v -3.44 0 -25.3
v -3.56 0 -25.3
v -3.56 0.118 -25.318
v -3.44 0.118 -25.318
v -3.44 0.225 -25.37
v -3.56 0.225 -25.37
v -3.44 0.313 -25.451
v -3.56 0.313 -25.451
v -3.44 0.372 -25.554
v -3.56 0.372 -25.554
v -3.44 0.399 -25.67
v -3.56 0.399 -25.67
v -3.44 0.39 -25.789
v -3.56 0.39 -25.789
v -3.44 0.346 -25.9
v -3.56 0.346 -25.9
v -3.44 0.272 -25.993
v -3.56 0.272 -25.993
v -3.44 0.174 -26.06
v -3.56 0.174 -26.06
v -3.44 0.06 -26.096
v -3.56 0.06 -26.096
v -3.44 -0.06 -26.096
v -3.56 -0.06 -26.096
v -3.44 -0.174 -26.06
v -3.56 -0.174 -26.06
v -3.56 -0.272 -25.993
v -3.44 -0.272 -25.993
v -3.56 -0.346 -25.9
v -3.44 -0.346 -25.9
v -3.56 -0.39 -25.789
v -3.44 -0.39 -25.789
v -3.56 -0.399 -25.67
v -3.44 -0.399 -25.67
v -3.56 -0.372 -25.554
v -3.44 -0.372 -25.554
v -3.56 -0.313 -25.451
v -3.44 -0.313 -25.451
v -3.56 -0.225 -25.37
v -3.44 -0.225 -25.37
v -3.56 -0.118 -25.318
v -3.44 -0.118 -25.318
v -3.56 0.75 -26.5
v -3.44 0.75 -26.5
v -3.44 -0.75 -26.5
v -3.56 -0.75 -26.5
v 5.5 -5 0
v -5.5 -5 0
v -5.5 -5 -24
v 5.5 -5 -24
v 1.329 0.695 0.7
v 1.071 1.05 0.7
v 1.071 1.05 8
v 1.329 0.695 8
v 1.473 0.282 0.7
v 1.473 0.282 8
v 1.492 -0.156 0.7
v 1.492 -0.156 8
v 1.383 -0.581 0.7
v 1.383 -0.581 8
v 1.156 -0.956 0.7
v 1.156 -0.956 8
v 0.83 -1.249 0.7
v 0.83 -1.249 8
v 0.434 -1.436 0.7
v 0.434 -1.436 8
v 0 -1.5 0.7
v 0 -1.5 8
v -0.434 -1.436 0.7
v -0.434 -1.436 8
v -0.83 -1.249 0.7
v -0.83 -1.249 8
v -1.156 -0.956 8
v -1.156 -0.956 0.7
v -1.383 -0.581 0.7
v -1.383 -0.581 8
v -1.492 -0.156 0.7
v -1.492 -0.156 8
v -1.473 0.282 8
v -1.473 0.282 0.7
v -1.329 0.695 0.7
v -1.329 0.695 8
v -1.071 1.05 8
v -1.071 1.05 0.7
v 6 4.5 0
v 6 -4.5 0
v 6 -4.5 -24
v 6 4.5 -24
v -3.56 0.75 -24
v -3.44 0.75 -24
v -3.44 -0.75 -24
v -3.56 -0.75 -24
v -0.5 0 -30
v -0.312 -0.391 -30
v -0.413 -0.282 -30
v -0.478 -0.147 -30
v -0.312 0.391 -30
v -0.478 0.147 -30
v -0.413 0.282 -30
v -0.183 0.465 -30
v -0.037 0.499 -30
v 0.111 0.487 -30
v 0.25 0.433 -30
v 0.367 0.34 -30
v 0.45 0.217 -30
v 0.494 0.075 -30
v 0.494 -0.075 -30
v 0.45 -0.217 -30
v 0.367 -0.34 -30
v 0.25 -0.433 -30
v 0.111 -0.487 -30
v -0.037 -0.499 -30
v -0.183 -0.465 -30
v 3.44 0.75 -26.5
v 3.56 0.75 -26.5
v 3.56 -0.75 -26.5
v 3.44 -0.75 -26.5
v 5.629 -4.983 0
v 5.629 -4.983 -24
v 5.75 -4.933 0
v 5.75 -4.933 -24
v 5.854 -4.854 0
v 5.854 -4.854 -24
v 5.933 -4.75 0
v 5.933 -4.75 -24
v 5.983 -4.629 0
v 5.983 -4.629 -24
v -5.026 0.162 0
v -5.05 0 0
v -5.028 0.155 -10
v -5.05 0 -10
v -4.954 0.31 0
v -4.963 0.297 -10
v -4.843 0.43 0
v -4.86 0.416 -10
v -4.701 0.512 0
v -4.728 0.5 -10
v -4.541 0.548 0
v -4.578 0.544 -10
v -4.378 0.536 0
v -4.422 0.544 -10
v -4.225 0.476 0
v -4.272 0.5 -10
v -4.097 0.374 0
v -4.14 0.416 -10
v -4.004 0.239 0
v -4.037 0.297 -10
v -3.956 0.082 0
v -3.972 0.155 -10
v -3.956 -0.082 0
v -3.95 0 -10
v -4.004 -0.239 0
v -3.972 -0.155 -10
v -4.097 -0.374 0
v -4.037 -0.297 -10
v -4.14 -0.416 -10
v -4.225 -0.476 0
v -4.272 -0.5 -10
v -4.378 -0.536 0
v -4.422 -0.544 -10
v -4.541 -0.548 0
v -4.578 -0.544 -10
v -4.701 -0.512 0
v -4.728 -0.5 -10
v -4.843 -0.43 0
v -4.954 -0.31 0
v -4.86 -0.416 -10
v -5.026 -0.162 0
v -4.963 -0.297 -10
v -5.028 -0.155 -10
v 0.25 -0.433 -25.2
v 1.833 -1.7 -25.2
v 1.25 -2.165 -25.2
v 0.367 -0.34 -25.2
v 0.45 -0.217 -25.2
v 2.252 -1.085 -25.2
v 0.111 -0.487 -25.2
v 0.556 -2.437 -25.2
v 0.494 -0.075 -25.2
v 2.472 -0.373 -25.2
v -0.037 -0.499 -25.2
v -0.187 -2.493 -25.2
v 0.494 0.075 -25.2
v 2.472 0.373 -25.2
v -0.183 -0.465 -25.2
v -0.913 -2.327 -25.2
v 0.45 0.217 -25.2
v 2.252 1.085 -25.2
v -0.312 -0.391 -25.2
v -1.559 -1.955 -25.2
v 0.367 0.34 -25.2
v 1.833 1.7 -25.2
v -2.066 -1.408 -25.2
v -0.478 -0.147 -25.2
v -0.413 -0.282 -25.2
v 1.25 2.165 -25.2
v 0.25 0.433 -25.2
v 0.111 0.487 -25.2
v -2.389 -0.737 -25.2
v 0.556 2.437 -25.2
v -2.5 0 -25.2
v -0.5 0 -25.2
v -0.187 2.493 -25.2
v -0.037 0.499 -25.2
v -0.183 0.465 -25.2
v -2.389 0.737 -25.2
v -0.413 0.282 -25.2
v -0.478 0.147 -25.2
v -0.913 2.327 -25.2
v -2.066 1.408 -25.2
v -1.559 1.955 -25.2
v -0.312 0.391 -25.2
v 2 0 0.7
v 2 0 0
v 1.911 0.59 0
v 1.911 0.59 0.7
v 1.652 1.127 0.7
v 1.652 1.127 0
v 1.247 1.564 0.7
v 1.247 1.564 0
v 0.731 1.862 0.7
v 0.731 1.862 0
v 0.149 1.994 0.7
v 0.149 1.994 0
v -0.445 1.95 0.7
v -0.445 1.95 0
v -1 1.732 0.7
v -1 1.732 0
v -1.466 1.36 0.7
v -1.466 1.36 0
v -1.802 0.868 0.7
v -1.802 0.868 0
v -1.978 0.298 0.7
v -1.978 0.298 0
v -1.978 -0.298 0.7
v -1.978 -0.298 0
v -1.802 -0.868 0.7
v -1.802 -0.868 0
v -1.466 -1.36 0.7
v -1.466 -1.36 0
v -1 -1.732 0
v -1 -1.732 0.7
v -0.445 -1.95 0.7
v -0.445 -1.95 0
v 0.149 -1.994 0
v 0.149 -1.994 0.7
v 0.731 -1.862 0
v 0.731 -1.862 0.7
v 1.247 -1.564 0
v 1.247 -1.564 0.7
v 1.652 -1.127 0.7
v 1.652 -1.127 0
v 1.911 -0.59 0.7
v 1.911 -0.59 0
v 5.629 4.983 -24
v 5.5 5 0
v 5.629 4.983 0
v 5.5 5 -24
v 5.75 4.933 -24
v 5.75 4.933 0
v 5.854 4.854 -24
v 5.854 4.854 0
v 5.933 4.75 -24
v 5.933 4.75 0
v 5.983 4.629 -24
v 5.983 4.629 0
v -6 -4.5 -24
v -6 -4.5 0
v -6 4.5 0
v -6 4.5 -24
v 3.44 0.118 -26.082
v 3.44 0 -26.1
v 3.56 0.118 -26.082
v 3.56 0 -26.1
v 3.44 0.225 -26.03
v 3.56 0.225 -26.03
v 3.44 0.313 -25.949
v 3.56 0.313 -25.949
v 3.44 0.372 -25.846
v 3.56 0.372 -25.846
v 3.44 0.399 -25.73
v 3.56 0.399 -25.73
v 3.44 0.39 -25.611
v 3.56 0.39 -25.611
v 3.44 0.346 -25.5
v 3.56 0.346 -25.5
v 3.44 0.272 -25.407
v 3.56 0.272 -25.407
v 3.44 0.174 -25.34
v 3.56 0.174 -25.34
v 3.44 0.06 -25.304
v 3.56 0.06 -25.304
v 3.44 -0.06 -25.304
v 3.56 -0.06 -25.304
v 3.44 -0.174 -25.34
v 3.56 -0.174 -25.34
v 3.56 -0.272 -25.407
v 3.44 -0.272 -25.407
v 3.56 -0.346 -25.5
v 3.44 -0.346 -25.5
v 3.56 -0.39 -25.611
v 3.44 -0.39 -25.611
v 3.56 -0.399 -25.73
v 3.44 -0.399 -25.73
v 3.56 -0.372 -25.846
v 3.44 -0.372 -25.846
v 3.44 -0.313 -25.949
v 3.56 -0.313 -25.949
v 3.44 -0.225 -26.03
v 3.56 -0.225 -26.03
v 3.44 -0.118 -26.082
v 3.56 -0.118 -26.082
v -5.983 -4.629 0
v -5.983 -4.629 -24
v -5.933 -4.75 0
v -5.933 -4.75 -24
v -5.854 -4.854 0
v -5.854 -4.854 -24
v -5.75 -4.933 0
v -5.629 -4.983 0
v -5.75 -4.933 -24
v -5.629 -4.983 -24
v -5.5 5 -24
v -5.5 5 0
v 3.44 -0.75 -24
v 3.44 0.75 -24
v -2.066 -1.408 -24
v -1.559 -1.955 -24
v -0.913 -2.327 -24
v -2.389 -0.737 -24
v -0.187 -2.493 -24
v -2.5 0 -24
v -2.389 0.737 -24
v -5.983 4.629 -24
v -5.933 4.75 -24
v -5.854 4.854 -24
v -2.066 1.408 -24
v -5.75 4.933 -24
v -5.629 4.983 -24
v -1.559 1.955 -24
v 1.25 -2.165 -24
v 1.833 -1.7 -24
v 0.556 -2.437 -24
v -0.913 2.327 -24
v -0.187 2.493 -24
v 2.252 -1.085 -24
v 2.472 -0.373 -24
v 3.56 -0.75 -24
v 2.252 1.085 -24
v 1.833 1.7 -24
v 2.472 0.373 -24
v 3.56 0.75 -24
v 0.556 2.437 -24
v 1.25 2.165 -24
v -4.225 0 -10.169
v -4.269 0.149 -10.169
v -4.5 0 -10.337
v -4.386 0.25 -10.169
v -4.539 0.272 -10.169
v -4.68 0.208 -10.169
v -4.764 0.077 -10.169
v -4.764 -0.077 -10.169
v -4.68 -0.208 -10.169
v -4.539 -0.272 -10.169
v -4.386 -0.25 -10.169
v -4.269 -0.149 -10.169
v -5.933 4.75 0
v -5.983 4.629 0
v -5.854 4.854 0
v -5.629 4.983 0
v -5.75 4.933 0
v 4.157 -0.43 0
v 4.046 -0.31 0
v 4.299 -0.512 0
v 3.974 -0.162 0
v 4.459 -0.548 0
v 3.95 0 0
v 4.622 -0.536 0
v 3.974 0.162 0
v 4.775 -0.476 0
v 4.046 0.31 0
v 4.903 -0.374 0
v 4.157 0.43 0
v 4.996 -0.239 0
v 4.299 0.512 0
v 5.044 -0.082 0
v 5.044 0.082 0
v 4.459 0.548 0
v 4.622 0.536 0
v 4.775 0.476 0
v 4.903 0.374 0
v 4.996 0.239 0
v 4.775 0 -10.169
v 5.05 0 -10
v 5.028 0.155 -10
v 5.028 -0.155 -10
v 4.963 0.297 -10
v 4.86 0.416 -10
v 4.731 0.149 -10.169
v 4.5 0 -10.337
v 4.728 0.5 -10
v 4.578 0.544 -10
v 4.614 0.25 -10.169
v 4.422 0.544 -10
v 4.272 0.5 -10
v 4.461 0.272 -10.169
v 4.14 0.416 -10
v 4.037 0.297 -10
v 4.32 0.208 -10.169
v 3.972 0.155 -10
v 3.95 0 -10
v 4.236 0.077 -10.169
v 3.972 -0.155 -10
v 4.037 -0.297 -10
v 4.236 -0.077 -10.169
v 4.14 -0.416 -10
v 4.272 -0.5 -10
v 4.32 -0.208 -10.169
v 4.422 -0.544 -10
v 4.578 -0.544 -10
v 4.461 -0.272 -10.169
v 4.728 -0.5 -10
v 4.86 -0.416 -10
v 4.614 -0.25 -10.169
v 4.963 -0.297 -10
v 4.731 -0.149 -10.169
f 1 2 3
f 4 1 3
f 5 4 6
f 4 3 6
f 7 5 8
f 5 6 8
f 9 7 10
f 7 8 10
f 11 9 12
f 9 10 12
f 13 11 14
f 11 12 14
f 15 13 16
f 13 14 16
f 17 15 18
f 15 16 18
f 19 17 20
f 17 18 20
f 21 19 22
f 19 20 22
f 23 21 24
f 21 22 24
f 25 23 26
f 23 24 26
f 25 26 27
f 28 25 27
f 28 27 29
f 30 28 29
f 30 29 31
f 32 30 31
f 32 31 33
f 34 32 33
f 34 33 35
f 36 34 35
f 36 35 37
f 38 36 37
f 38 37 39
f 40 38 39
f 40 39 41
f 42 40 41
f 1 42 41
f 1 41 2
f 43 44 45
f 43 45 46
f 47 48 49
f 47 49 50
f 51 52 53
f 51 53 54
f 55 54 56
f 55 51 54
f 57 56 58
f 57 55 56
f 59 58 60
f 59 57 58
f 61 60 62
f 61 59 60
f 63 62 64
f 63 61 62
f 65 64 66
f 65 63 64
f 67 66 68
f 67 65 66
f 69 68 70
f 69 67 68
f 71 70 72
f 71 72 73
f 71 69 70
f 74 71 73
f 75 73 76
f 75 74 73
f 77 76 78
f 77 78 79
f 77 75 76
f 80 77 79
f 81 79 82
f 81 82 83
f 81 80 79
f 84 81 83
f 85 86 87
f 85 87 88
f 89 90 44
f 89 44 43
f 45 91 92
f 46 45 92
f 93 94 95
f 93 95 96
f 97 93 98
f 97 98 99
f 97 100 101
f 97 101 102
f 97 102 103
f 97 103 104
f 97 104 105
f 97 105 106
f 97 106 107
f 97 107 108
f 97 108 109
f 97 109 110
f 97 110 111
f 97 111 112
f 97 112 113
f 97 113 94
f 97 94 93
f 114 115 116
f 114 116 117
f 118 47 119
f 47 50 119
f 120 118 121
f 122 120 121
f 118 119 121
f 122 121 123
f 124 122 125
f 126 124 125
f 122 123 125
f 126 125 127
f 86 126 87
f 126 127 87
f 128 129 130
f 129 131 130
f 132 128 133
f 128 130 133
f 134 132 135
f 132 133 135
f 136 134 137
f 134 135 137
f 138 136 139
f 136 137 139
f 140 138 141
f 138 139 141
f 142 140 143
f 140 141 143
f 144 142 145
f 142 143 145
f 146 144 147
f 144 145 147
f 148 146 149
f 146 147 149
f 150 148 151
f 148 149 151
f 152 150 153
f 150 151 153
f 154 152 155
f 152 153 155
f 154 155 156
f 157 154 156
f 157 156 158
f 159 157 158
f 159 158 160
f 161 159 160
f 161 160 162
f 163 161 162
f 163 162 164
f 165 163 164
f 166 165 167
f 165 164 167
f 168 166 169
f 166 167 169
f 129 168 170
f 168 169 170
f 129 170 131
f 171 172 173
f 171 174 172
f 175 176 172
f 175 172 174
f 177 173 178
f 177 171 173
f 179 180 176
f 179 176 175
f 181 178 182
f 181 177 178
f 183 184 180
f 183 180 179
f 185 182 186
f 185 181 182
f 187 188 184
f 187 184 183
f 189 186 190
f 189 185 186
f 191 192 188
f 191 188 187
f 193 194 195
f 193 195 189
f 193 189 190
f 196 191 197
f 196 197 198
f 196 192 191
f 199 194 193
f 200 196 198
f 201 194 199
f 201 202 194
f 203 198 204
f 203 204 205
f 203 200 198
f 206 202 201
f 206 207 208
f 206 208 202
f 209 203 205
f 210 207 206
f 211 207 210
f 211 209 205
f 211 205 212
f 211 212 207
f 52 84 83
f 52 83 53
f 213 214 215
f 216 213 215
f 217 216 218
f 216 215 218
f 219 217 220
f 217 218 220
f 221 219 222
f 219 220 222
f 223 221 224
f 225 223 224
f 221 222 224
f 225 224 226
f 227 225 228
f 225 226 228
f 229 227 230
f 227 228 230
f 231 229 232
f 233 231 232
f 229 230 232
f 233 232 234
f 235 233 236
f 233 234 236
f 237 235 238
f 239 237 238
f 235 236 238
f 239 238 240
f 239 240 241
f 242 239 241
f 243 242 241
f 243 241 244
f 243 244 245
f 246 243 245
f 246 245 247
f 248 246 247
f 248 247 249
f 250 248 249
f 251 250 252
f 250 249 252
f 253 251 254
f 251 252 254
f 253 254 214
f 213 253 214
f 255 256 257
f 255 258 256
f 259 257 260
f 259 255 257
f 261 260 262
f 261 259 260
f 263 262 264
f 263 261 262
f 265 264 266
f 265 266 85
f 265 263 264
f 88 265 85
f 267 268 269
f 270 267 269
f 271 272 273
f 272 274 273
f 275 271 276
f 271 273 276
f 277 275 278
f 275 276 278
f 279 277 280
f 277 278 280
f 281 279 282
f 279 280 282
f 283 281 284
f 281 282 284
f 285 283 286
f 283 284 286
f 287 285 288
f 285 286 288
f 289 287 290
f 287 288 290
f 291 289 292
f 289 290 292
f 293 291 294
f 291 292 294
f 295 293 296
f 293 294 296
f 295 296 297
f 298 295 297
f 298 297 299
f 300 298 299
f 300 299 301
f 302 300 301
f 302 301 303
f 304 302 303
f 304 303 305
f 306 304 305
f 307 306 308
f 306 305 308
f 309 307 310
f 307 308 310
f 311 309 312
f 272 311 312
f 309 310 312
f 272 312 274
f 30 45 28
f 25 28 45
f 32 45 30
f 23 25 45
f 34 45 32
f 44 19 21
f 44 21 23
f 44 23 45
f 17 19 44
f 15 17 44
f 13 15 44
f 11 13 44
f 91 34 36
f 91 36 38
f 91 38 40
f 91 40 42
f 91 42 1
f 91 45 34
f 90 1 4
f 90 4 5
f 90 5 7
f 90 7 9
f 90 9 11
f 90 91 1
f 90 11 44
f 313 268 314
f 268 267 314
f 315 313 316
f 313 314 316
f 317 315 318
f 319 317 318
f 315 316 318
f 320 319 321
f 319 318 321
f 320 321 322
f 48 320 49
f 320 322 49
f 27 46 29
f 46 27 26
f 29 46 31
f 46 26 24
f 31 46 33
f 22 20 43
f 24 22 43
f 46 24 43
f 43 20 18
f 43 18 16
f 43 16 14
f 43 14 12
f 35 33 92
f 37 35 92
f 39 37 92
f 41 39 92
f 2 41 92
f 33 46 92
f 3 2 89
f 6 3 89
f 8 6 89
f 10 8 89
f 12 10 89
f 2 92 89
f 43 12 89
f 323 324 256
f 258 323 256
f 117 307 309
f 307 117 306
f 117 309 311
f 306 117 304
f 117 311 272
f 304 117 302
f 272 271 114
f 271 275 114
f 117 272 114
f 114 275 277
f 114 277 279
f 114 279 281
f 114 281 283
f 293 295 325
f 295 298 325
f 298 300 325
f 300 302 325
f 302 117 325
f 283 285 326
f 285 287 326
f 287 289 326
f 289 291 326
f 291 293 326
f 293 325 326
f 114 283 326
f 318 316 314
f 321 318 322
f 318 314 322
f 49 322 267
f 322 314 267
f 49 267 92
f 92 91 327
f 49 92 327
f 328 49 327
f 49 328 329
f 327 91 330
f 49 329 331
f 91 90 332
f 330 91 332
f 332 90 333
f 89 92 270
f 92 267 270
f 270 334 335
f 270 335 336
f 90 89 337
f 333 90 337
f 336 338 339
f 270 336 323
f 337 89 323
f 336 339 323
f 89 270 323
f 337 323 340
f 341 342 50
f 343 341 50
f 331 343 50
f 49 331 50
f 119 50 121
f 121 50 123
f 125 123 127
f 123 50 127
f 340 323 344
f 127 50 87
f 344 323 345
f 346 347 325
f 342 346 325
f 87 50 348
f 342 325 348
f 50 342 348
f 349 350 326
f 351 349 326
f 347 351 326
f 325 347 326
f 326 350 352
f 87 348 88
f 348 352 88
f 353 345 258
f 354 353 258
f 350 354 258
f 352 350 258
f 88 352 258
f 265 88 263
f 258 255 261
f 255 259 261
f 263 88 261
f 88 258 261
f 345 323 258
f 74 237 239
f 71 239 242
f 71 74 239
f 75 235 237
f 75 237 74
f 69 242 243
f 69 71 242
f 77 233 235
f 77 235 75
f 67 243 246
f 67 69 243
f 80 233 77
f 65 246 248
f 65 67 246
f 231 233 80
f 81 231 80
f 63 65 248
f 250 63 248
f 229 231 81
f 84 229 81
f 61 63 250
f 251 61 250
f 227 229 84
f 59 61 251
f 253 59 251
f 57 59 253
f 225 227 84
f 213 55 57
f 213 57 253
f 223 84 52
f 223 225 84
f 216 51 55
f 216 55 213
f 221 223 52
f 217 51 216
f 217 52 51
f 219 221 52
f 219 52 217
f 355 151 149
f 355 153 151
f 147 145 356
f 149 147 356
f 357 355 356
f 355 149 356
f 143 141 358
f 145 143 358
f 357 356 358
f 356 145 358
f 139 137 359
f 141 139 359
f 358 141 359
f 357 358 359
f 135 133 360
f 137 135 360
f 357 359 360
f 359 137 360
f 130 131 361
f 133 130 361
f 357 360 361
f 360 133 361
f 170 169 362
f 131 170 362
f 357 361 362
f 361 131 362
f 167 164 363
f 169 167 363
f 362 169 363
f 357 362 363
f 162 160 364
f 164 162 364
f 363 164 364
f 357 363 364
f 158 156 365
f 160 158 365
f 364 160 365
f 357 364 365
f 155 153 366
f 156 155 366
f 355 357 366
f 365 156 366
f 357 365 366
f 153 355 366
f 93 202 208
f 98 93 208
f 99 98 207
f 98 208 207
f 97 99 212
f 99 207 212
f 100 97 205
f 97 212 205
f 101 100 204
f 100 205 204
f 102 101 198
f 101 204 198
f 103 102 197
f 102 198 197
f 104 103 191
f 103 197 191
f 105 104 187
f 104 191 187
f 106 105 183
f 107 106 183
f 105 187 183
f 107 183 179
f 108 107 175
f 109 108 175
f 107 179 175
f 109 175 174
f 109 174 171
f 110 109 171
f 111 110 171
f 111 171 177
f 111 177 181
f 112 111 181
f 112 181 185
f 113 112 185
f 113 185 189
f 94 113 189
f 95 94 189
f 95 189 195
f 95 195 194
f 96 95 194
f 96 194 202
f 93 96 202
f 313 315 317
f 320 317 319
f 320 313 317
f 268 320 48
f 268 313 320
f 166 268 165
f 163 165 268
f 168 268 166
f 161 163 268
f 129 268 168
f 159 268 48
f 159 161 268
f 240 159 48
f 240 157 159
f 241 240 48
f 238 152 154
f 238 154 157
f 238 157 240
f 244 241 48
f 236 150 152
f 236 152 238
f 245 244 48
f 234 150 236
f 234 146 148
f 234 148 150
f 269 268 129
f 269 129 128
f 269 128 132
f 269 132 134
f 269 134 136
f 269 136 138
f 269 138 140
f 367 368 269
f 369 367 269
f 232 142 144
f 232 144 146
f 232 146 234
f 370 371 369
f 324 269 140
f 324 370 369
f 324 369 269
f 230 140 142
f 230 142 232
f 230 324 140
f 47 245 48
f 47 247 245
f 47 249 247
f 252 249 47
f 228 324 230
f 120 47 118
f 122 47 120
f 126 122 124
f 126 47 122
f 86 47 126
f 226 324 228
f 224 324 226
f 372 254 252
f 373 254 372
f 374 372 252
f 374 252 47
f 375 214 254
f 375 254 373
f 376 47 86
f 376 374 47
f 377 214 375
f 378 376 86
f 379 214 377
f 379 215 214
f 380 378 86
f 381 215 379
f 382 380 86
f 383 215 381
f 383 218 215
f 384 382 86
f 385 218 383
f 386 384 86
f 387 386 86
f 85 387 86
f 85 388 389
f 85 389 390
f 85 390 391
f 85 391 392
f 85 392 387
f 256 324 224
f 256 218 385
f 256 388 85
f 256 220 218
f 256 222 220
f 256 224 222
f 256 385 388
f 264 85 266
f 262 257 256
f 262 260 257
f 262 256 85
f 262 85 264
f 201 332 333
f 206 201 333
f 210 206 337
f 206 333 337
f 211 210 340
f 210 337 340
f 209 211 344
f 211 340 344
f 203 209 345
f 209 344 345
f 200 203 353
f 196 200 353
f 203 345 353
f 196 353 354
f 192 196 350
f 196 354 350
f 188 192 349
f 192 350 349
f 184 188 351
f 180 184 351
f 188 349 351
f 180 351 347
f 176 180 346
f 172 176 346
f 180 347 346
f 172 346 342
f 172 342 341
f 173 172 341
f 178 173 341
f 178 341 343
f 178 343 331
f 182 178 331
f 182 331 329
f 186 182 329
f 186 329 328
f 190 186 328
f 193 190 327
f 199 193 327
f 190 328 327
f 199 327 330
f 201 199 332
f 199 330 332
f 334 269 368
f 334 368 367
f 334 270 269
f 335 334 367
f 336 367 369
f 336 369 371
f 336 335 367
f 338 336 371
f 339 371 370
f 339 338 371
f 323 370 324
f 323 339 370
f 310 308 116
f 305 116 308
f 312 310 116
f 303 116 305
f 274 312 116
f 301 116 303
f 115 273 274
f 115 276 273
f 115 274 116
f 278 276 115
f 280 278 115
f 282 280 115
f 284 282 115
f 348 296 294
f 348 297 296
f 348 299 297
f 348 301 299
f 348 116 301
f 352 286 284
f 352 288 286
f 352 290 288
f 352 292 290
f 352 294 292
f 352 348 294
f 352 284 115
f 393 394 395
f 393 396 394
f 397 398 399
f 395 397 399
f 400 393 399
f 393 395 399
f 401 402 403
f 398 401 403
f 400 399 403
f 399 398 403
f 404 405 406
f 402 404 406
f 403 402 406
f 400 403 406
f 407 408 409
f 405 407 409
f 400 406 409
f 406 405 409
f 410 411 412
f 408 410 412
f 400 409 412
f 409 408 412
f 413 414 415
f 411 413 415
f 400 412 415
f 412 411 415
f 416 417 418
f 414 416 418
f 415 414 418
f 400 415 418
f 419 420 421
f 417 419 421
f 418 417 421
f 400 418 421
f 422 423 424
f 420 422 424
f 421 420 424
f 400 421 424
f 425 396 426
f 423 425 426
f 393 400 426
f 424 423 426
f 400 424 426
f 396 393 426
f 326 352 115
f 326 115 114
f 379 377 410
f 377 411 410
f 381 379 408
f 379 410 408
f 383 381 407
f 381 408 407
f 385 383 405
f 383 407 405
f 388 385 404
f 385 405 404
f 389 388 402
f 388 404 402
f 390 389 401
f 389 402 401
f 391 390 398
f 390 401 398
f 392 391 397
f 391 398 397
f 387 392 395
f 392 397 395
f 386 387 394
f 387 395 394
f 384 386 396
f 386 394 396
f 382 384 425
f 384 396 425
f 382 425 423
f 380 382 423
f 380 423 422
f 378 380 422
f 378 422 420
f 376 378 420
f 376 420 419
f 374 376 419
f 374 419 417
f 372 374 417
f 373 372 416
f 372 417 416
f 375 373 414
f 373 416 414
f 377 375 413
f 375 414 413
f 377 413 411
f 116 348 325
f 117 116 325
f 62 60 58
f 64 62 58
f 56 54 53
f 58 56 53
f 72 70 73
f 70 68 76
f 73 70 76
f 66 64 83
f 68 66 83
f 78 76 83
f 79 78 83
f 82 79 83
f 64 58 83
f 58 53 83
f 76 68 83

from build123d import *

# Parameters (mm, degrees)
TOP_W                                     = 12
TOP_H                                     = 10
PRECISION_MICRODRIVES_MODEL_212_109_DEPTH = 24
TOP_RING_2_R                              = 2
TOP_RING_DEPTH                            = 0.7
HOLE_WIZARD_M1_1_D                        = 1.1
HOLE_WIZARD_M1_1_DEPTH                    = 10
HOLE_WIZARD_M1_1_TIP                      = 0.337040433
HOLE_WIZARD_M1_2_D                        = 1.1
HOLE_WIZARD_M1_2_DEPTH                    = 10
HOLE_WIZARD_M1_2_TIP                      = 0.337040433
D_SHAFT_DEPTH                             = 8
VERRUNDUNG1_R                             = 0.5
SKIZZE12_R                                = 2.5
BOTTOM_DEPTH                              = 1.2
SKIZZE13_R                                = 0.5
BOLT_DEPTH                                = 6
SKIZZE14_W                                = 0.12
SKIZZE14_H                                = 1.5
FLAPS_DEPTH                               = 2.5
FLAP1_CUT_REACH                           = 11.56
SKIZZE15_R                                = 0.4
FLAP2_CUT_REACH                           = 11.56
SKIZZE16_R                                = 0.4


with BuildPart() as part:
    # top → Precision Microdrives Model 212-109 (new body)
    with BuildSketch(Plane.XY):
        Rectangle(TOP_W, TOP_H)
    extrude(amount=-PRECISION_MICRODRIVES_MODEL_212_109_DEPTH)

    # top ring 2 → top-ring (add)
    with BuildSketch(Plane.XY):
        Circle(TOP_RING_2_R)
    extrude(amount=TOP_RING_DEPTH)

    # Hole Wizard M1-1
    with Locations(Plane.XY):
        with Locations((-4.5, 0)):
            Hole(HOLE_WIZARD_M1_1_D / 2, depth=HOLE_WIZARD_M1_1_DEPTH)
            with Locations((0, 0, -(HOLE_WIZARD_M1_1_DEPTH + HOLE_WIZARD_M1_1_TIP / 2))):  # 117° drill point
                Cone(0, HOLE_WIZARD_M1_1_D / 2, HOLE_WIZARD_M1_1_TIP, mode=Mode.SUBTRACT)

    # Hole Wizard M1-2
    with Locations(Plane.XY):
        with Locations((4.5, 0)):
            Hole(HOLE_WIZARD_M1_2_D / 2, depth=HOLE_WIZARD_M1_2_DEPTH)
            with Locations((0, 0, -(HOLE_WIZARD_M1_2_DEPTH + HOLE_WIZARD_M1_2_TIP / 2))):  # 117° drill point
                Cone(0, HOLE_WIZARD_M1_2_D / 2, HOLE_WIZARD_M1_2_TIP, mode=Mode.SUBTRACT)

    # Skizze11 → D-Shaft (add)
    with BuildSketch(Plane.XY):
        with BuildLine():
            Line((-1.071214264, 1.05), (1.071214264, 1.05))
            ThreePointArc((1.071214264, 1.05), (0, -1.5), (-1.071214264, 1.05))
        make_face()
    extrude(amount=D_SHAFT_DEPTH)

    # Verrundung1
    verrundung1_edges = [part.edges().sort_by_distance(p)[0] for p in [
        (-6, 5, -12),
        (6, 5, -12),
        (6, -5, -12),
        (-6, -5, -12),
    ]]
    fillet(verrundung1_edges, radius=VERRUNDUNG1_R)

    # Skizze12 → bottom (add)
    with BuildSketch(Plane(origin=(0, 0, -24), x_dir=(-1, 0, 0), z_dir=(0, 0, -1))):
        Circle(SKIZZE12_R)
    extrude(amount=BOTTOM_DEPTH)

    # Skizze13 → bolt (add)
    with BuildSketch(Plane(origin=(0, 0, -24), x_dir=(-1, 0, 0), z_dir=(0, 0, -1))):
        Circle(SKIZZE13_R)
    extrude(amount=BOLT_DEPTH)

    # Skizze14 → flaps (add)
    with BuildSketch(Plane(origin=(0, 0, -24), x_dir=(-1, 0, 0), z_dir=(0, 0, -1))):
        with Locations((-3.5, 0)):
            Rectangle(SKIZZE14_W, SKIZZE14_H)
        with Locations((3.5, 0)):
            Rectangle(SKIZZE14_W, SKIZZE14_H)
    extrude(amount=FLAPS_DEPTH)

    # Skizze15 → flap1-cut (cut, up to next)
    with BuildSketch(Plane.ZY.offset(3.56), mode=Mode.PRIVATE) as flap1_cut_sk1:
        with Locations((-25.7, 0)):
            Circle(SKIZZE15_R)
    flap1_cut_tool1 = extrude(flap1_cut_sk1.sketch, amount=-FLAP1_CUT_REACH, mode=Mode.PRIVATE) & part.part
    add(flap1_cut_tool1.solids().sort_by_distance((-3.56, 0, -25.7))[0], mode=Mode.SUBTRACT)

    # Skizze16 → flap2-cut (cut, up to next)
    with BuildSketch(Plane(origin=(3.56, 0, 0), x_dir=(0, 0, -1), z_dir=(1, 0, 0)), mode=Mode.PRIVATE) as flap2_cut_sk1:
        with Locations((25.7, 0)):
            Circle(SKIZZE16_R)
    flap2_cut_tool1 = extrude(flap2_cut_sk1.sketch, amount=-FLAP2_CUT_REACH, mode=Mode.PRIVATE) & part.part
    add(flap2_cut_tool1.solids().sort_by_distance((3.56, 0, -25.7))[0], mode=Mode.SUBTRACT)


solid = part.part
